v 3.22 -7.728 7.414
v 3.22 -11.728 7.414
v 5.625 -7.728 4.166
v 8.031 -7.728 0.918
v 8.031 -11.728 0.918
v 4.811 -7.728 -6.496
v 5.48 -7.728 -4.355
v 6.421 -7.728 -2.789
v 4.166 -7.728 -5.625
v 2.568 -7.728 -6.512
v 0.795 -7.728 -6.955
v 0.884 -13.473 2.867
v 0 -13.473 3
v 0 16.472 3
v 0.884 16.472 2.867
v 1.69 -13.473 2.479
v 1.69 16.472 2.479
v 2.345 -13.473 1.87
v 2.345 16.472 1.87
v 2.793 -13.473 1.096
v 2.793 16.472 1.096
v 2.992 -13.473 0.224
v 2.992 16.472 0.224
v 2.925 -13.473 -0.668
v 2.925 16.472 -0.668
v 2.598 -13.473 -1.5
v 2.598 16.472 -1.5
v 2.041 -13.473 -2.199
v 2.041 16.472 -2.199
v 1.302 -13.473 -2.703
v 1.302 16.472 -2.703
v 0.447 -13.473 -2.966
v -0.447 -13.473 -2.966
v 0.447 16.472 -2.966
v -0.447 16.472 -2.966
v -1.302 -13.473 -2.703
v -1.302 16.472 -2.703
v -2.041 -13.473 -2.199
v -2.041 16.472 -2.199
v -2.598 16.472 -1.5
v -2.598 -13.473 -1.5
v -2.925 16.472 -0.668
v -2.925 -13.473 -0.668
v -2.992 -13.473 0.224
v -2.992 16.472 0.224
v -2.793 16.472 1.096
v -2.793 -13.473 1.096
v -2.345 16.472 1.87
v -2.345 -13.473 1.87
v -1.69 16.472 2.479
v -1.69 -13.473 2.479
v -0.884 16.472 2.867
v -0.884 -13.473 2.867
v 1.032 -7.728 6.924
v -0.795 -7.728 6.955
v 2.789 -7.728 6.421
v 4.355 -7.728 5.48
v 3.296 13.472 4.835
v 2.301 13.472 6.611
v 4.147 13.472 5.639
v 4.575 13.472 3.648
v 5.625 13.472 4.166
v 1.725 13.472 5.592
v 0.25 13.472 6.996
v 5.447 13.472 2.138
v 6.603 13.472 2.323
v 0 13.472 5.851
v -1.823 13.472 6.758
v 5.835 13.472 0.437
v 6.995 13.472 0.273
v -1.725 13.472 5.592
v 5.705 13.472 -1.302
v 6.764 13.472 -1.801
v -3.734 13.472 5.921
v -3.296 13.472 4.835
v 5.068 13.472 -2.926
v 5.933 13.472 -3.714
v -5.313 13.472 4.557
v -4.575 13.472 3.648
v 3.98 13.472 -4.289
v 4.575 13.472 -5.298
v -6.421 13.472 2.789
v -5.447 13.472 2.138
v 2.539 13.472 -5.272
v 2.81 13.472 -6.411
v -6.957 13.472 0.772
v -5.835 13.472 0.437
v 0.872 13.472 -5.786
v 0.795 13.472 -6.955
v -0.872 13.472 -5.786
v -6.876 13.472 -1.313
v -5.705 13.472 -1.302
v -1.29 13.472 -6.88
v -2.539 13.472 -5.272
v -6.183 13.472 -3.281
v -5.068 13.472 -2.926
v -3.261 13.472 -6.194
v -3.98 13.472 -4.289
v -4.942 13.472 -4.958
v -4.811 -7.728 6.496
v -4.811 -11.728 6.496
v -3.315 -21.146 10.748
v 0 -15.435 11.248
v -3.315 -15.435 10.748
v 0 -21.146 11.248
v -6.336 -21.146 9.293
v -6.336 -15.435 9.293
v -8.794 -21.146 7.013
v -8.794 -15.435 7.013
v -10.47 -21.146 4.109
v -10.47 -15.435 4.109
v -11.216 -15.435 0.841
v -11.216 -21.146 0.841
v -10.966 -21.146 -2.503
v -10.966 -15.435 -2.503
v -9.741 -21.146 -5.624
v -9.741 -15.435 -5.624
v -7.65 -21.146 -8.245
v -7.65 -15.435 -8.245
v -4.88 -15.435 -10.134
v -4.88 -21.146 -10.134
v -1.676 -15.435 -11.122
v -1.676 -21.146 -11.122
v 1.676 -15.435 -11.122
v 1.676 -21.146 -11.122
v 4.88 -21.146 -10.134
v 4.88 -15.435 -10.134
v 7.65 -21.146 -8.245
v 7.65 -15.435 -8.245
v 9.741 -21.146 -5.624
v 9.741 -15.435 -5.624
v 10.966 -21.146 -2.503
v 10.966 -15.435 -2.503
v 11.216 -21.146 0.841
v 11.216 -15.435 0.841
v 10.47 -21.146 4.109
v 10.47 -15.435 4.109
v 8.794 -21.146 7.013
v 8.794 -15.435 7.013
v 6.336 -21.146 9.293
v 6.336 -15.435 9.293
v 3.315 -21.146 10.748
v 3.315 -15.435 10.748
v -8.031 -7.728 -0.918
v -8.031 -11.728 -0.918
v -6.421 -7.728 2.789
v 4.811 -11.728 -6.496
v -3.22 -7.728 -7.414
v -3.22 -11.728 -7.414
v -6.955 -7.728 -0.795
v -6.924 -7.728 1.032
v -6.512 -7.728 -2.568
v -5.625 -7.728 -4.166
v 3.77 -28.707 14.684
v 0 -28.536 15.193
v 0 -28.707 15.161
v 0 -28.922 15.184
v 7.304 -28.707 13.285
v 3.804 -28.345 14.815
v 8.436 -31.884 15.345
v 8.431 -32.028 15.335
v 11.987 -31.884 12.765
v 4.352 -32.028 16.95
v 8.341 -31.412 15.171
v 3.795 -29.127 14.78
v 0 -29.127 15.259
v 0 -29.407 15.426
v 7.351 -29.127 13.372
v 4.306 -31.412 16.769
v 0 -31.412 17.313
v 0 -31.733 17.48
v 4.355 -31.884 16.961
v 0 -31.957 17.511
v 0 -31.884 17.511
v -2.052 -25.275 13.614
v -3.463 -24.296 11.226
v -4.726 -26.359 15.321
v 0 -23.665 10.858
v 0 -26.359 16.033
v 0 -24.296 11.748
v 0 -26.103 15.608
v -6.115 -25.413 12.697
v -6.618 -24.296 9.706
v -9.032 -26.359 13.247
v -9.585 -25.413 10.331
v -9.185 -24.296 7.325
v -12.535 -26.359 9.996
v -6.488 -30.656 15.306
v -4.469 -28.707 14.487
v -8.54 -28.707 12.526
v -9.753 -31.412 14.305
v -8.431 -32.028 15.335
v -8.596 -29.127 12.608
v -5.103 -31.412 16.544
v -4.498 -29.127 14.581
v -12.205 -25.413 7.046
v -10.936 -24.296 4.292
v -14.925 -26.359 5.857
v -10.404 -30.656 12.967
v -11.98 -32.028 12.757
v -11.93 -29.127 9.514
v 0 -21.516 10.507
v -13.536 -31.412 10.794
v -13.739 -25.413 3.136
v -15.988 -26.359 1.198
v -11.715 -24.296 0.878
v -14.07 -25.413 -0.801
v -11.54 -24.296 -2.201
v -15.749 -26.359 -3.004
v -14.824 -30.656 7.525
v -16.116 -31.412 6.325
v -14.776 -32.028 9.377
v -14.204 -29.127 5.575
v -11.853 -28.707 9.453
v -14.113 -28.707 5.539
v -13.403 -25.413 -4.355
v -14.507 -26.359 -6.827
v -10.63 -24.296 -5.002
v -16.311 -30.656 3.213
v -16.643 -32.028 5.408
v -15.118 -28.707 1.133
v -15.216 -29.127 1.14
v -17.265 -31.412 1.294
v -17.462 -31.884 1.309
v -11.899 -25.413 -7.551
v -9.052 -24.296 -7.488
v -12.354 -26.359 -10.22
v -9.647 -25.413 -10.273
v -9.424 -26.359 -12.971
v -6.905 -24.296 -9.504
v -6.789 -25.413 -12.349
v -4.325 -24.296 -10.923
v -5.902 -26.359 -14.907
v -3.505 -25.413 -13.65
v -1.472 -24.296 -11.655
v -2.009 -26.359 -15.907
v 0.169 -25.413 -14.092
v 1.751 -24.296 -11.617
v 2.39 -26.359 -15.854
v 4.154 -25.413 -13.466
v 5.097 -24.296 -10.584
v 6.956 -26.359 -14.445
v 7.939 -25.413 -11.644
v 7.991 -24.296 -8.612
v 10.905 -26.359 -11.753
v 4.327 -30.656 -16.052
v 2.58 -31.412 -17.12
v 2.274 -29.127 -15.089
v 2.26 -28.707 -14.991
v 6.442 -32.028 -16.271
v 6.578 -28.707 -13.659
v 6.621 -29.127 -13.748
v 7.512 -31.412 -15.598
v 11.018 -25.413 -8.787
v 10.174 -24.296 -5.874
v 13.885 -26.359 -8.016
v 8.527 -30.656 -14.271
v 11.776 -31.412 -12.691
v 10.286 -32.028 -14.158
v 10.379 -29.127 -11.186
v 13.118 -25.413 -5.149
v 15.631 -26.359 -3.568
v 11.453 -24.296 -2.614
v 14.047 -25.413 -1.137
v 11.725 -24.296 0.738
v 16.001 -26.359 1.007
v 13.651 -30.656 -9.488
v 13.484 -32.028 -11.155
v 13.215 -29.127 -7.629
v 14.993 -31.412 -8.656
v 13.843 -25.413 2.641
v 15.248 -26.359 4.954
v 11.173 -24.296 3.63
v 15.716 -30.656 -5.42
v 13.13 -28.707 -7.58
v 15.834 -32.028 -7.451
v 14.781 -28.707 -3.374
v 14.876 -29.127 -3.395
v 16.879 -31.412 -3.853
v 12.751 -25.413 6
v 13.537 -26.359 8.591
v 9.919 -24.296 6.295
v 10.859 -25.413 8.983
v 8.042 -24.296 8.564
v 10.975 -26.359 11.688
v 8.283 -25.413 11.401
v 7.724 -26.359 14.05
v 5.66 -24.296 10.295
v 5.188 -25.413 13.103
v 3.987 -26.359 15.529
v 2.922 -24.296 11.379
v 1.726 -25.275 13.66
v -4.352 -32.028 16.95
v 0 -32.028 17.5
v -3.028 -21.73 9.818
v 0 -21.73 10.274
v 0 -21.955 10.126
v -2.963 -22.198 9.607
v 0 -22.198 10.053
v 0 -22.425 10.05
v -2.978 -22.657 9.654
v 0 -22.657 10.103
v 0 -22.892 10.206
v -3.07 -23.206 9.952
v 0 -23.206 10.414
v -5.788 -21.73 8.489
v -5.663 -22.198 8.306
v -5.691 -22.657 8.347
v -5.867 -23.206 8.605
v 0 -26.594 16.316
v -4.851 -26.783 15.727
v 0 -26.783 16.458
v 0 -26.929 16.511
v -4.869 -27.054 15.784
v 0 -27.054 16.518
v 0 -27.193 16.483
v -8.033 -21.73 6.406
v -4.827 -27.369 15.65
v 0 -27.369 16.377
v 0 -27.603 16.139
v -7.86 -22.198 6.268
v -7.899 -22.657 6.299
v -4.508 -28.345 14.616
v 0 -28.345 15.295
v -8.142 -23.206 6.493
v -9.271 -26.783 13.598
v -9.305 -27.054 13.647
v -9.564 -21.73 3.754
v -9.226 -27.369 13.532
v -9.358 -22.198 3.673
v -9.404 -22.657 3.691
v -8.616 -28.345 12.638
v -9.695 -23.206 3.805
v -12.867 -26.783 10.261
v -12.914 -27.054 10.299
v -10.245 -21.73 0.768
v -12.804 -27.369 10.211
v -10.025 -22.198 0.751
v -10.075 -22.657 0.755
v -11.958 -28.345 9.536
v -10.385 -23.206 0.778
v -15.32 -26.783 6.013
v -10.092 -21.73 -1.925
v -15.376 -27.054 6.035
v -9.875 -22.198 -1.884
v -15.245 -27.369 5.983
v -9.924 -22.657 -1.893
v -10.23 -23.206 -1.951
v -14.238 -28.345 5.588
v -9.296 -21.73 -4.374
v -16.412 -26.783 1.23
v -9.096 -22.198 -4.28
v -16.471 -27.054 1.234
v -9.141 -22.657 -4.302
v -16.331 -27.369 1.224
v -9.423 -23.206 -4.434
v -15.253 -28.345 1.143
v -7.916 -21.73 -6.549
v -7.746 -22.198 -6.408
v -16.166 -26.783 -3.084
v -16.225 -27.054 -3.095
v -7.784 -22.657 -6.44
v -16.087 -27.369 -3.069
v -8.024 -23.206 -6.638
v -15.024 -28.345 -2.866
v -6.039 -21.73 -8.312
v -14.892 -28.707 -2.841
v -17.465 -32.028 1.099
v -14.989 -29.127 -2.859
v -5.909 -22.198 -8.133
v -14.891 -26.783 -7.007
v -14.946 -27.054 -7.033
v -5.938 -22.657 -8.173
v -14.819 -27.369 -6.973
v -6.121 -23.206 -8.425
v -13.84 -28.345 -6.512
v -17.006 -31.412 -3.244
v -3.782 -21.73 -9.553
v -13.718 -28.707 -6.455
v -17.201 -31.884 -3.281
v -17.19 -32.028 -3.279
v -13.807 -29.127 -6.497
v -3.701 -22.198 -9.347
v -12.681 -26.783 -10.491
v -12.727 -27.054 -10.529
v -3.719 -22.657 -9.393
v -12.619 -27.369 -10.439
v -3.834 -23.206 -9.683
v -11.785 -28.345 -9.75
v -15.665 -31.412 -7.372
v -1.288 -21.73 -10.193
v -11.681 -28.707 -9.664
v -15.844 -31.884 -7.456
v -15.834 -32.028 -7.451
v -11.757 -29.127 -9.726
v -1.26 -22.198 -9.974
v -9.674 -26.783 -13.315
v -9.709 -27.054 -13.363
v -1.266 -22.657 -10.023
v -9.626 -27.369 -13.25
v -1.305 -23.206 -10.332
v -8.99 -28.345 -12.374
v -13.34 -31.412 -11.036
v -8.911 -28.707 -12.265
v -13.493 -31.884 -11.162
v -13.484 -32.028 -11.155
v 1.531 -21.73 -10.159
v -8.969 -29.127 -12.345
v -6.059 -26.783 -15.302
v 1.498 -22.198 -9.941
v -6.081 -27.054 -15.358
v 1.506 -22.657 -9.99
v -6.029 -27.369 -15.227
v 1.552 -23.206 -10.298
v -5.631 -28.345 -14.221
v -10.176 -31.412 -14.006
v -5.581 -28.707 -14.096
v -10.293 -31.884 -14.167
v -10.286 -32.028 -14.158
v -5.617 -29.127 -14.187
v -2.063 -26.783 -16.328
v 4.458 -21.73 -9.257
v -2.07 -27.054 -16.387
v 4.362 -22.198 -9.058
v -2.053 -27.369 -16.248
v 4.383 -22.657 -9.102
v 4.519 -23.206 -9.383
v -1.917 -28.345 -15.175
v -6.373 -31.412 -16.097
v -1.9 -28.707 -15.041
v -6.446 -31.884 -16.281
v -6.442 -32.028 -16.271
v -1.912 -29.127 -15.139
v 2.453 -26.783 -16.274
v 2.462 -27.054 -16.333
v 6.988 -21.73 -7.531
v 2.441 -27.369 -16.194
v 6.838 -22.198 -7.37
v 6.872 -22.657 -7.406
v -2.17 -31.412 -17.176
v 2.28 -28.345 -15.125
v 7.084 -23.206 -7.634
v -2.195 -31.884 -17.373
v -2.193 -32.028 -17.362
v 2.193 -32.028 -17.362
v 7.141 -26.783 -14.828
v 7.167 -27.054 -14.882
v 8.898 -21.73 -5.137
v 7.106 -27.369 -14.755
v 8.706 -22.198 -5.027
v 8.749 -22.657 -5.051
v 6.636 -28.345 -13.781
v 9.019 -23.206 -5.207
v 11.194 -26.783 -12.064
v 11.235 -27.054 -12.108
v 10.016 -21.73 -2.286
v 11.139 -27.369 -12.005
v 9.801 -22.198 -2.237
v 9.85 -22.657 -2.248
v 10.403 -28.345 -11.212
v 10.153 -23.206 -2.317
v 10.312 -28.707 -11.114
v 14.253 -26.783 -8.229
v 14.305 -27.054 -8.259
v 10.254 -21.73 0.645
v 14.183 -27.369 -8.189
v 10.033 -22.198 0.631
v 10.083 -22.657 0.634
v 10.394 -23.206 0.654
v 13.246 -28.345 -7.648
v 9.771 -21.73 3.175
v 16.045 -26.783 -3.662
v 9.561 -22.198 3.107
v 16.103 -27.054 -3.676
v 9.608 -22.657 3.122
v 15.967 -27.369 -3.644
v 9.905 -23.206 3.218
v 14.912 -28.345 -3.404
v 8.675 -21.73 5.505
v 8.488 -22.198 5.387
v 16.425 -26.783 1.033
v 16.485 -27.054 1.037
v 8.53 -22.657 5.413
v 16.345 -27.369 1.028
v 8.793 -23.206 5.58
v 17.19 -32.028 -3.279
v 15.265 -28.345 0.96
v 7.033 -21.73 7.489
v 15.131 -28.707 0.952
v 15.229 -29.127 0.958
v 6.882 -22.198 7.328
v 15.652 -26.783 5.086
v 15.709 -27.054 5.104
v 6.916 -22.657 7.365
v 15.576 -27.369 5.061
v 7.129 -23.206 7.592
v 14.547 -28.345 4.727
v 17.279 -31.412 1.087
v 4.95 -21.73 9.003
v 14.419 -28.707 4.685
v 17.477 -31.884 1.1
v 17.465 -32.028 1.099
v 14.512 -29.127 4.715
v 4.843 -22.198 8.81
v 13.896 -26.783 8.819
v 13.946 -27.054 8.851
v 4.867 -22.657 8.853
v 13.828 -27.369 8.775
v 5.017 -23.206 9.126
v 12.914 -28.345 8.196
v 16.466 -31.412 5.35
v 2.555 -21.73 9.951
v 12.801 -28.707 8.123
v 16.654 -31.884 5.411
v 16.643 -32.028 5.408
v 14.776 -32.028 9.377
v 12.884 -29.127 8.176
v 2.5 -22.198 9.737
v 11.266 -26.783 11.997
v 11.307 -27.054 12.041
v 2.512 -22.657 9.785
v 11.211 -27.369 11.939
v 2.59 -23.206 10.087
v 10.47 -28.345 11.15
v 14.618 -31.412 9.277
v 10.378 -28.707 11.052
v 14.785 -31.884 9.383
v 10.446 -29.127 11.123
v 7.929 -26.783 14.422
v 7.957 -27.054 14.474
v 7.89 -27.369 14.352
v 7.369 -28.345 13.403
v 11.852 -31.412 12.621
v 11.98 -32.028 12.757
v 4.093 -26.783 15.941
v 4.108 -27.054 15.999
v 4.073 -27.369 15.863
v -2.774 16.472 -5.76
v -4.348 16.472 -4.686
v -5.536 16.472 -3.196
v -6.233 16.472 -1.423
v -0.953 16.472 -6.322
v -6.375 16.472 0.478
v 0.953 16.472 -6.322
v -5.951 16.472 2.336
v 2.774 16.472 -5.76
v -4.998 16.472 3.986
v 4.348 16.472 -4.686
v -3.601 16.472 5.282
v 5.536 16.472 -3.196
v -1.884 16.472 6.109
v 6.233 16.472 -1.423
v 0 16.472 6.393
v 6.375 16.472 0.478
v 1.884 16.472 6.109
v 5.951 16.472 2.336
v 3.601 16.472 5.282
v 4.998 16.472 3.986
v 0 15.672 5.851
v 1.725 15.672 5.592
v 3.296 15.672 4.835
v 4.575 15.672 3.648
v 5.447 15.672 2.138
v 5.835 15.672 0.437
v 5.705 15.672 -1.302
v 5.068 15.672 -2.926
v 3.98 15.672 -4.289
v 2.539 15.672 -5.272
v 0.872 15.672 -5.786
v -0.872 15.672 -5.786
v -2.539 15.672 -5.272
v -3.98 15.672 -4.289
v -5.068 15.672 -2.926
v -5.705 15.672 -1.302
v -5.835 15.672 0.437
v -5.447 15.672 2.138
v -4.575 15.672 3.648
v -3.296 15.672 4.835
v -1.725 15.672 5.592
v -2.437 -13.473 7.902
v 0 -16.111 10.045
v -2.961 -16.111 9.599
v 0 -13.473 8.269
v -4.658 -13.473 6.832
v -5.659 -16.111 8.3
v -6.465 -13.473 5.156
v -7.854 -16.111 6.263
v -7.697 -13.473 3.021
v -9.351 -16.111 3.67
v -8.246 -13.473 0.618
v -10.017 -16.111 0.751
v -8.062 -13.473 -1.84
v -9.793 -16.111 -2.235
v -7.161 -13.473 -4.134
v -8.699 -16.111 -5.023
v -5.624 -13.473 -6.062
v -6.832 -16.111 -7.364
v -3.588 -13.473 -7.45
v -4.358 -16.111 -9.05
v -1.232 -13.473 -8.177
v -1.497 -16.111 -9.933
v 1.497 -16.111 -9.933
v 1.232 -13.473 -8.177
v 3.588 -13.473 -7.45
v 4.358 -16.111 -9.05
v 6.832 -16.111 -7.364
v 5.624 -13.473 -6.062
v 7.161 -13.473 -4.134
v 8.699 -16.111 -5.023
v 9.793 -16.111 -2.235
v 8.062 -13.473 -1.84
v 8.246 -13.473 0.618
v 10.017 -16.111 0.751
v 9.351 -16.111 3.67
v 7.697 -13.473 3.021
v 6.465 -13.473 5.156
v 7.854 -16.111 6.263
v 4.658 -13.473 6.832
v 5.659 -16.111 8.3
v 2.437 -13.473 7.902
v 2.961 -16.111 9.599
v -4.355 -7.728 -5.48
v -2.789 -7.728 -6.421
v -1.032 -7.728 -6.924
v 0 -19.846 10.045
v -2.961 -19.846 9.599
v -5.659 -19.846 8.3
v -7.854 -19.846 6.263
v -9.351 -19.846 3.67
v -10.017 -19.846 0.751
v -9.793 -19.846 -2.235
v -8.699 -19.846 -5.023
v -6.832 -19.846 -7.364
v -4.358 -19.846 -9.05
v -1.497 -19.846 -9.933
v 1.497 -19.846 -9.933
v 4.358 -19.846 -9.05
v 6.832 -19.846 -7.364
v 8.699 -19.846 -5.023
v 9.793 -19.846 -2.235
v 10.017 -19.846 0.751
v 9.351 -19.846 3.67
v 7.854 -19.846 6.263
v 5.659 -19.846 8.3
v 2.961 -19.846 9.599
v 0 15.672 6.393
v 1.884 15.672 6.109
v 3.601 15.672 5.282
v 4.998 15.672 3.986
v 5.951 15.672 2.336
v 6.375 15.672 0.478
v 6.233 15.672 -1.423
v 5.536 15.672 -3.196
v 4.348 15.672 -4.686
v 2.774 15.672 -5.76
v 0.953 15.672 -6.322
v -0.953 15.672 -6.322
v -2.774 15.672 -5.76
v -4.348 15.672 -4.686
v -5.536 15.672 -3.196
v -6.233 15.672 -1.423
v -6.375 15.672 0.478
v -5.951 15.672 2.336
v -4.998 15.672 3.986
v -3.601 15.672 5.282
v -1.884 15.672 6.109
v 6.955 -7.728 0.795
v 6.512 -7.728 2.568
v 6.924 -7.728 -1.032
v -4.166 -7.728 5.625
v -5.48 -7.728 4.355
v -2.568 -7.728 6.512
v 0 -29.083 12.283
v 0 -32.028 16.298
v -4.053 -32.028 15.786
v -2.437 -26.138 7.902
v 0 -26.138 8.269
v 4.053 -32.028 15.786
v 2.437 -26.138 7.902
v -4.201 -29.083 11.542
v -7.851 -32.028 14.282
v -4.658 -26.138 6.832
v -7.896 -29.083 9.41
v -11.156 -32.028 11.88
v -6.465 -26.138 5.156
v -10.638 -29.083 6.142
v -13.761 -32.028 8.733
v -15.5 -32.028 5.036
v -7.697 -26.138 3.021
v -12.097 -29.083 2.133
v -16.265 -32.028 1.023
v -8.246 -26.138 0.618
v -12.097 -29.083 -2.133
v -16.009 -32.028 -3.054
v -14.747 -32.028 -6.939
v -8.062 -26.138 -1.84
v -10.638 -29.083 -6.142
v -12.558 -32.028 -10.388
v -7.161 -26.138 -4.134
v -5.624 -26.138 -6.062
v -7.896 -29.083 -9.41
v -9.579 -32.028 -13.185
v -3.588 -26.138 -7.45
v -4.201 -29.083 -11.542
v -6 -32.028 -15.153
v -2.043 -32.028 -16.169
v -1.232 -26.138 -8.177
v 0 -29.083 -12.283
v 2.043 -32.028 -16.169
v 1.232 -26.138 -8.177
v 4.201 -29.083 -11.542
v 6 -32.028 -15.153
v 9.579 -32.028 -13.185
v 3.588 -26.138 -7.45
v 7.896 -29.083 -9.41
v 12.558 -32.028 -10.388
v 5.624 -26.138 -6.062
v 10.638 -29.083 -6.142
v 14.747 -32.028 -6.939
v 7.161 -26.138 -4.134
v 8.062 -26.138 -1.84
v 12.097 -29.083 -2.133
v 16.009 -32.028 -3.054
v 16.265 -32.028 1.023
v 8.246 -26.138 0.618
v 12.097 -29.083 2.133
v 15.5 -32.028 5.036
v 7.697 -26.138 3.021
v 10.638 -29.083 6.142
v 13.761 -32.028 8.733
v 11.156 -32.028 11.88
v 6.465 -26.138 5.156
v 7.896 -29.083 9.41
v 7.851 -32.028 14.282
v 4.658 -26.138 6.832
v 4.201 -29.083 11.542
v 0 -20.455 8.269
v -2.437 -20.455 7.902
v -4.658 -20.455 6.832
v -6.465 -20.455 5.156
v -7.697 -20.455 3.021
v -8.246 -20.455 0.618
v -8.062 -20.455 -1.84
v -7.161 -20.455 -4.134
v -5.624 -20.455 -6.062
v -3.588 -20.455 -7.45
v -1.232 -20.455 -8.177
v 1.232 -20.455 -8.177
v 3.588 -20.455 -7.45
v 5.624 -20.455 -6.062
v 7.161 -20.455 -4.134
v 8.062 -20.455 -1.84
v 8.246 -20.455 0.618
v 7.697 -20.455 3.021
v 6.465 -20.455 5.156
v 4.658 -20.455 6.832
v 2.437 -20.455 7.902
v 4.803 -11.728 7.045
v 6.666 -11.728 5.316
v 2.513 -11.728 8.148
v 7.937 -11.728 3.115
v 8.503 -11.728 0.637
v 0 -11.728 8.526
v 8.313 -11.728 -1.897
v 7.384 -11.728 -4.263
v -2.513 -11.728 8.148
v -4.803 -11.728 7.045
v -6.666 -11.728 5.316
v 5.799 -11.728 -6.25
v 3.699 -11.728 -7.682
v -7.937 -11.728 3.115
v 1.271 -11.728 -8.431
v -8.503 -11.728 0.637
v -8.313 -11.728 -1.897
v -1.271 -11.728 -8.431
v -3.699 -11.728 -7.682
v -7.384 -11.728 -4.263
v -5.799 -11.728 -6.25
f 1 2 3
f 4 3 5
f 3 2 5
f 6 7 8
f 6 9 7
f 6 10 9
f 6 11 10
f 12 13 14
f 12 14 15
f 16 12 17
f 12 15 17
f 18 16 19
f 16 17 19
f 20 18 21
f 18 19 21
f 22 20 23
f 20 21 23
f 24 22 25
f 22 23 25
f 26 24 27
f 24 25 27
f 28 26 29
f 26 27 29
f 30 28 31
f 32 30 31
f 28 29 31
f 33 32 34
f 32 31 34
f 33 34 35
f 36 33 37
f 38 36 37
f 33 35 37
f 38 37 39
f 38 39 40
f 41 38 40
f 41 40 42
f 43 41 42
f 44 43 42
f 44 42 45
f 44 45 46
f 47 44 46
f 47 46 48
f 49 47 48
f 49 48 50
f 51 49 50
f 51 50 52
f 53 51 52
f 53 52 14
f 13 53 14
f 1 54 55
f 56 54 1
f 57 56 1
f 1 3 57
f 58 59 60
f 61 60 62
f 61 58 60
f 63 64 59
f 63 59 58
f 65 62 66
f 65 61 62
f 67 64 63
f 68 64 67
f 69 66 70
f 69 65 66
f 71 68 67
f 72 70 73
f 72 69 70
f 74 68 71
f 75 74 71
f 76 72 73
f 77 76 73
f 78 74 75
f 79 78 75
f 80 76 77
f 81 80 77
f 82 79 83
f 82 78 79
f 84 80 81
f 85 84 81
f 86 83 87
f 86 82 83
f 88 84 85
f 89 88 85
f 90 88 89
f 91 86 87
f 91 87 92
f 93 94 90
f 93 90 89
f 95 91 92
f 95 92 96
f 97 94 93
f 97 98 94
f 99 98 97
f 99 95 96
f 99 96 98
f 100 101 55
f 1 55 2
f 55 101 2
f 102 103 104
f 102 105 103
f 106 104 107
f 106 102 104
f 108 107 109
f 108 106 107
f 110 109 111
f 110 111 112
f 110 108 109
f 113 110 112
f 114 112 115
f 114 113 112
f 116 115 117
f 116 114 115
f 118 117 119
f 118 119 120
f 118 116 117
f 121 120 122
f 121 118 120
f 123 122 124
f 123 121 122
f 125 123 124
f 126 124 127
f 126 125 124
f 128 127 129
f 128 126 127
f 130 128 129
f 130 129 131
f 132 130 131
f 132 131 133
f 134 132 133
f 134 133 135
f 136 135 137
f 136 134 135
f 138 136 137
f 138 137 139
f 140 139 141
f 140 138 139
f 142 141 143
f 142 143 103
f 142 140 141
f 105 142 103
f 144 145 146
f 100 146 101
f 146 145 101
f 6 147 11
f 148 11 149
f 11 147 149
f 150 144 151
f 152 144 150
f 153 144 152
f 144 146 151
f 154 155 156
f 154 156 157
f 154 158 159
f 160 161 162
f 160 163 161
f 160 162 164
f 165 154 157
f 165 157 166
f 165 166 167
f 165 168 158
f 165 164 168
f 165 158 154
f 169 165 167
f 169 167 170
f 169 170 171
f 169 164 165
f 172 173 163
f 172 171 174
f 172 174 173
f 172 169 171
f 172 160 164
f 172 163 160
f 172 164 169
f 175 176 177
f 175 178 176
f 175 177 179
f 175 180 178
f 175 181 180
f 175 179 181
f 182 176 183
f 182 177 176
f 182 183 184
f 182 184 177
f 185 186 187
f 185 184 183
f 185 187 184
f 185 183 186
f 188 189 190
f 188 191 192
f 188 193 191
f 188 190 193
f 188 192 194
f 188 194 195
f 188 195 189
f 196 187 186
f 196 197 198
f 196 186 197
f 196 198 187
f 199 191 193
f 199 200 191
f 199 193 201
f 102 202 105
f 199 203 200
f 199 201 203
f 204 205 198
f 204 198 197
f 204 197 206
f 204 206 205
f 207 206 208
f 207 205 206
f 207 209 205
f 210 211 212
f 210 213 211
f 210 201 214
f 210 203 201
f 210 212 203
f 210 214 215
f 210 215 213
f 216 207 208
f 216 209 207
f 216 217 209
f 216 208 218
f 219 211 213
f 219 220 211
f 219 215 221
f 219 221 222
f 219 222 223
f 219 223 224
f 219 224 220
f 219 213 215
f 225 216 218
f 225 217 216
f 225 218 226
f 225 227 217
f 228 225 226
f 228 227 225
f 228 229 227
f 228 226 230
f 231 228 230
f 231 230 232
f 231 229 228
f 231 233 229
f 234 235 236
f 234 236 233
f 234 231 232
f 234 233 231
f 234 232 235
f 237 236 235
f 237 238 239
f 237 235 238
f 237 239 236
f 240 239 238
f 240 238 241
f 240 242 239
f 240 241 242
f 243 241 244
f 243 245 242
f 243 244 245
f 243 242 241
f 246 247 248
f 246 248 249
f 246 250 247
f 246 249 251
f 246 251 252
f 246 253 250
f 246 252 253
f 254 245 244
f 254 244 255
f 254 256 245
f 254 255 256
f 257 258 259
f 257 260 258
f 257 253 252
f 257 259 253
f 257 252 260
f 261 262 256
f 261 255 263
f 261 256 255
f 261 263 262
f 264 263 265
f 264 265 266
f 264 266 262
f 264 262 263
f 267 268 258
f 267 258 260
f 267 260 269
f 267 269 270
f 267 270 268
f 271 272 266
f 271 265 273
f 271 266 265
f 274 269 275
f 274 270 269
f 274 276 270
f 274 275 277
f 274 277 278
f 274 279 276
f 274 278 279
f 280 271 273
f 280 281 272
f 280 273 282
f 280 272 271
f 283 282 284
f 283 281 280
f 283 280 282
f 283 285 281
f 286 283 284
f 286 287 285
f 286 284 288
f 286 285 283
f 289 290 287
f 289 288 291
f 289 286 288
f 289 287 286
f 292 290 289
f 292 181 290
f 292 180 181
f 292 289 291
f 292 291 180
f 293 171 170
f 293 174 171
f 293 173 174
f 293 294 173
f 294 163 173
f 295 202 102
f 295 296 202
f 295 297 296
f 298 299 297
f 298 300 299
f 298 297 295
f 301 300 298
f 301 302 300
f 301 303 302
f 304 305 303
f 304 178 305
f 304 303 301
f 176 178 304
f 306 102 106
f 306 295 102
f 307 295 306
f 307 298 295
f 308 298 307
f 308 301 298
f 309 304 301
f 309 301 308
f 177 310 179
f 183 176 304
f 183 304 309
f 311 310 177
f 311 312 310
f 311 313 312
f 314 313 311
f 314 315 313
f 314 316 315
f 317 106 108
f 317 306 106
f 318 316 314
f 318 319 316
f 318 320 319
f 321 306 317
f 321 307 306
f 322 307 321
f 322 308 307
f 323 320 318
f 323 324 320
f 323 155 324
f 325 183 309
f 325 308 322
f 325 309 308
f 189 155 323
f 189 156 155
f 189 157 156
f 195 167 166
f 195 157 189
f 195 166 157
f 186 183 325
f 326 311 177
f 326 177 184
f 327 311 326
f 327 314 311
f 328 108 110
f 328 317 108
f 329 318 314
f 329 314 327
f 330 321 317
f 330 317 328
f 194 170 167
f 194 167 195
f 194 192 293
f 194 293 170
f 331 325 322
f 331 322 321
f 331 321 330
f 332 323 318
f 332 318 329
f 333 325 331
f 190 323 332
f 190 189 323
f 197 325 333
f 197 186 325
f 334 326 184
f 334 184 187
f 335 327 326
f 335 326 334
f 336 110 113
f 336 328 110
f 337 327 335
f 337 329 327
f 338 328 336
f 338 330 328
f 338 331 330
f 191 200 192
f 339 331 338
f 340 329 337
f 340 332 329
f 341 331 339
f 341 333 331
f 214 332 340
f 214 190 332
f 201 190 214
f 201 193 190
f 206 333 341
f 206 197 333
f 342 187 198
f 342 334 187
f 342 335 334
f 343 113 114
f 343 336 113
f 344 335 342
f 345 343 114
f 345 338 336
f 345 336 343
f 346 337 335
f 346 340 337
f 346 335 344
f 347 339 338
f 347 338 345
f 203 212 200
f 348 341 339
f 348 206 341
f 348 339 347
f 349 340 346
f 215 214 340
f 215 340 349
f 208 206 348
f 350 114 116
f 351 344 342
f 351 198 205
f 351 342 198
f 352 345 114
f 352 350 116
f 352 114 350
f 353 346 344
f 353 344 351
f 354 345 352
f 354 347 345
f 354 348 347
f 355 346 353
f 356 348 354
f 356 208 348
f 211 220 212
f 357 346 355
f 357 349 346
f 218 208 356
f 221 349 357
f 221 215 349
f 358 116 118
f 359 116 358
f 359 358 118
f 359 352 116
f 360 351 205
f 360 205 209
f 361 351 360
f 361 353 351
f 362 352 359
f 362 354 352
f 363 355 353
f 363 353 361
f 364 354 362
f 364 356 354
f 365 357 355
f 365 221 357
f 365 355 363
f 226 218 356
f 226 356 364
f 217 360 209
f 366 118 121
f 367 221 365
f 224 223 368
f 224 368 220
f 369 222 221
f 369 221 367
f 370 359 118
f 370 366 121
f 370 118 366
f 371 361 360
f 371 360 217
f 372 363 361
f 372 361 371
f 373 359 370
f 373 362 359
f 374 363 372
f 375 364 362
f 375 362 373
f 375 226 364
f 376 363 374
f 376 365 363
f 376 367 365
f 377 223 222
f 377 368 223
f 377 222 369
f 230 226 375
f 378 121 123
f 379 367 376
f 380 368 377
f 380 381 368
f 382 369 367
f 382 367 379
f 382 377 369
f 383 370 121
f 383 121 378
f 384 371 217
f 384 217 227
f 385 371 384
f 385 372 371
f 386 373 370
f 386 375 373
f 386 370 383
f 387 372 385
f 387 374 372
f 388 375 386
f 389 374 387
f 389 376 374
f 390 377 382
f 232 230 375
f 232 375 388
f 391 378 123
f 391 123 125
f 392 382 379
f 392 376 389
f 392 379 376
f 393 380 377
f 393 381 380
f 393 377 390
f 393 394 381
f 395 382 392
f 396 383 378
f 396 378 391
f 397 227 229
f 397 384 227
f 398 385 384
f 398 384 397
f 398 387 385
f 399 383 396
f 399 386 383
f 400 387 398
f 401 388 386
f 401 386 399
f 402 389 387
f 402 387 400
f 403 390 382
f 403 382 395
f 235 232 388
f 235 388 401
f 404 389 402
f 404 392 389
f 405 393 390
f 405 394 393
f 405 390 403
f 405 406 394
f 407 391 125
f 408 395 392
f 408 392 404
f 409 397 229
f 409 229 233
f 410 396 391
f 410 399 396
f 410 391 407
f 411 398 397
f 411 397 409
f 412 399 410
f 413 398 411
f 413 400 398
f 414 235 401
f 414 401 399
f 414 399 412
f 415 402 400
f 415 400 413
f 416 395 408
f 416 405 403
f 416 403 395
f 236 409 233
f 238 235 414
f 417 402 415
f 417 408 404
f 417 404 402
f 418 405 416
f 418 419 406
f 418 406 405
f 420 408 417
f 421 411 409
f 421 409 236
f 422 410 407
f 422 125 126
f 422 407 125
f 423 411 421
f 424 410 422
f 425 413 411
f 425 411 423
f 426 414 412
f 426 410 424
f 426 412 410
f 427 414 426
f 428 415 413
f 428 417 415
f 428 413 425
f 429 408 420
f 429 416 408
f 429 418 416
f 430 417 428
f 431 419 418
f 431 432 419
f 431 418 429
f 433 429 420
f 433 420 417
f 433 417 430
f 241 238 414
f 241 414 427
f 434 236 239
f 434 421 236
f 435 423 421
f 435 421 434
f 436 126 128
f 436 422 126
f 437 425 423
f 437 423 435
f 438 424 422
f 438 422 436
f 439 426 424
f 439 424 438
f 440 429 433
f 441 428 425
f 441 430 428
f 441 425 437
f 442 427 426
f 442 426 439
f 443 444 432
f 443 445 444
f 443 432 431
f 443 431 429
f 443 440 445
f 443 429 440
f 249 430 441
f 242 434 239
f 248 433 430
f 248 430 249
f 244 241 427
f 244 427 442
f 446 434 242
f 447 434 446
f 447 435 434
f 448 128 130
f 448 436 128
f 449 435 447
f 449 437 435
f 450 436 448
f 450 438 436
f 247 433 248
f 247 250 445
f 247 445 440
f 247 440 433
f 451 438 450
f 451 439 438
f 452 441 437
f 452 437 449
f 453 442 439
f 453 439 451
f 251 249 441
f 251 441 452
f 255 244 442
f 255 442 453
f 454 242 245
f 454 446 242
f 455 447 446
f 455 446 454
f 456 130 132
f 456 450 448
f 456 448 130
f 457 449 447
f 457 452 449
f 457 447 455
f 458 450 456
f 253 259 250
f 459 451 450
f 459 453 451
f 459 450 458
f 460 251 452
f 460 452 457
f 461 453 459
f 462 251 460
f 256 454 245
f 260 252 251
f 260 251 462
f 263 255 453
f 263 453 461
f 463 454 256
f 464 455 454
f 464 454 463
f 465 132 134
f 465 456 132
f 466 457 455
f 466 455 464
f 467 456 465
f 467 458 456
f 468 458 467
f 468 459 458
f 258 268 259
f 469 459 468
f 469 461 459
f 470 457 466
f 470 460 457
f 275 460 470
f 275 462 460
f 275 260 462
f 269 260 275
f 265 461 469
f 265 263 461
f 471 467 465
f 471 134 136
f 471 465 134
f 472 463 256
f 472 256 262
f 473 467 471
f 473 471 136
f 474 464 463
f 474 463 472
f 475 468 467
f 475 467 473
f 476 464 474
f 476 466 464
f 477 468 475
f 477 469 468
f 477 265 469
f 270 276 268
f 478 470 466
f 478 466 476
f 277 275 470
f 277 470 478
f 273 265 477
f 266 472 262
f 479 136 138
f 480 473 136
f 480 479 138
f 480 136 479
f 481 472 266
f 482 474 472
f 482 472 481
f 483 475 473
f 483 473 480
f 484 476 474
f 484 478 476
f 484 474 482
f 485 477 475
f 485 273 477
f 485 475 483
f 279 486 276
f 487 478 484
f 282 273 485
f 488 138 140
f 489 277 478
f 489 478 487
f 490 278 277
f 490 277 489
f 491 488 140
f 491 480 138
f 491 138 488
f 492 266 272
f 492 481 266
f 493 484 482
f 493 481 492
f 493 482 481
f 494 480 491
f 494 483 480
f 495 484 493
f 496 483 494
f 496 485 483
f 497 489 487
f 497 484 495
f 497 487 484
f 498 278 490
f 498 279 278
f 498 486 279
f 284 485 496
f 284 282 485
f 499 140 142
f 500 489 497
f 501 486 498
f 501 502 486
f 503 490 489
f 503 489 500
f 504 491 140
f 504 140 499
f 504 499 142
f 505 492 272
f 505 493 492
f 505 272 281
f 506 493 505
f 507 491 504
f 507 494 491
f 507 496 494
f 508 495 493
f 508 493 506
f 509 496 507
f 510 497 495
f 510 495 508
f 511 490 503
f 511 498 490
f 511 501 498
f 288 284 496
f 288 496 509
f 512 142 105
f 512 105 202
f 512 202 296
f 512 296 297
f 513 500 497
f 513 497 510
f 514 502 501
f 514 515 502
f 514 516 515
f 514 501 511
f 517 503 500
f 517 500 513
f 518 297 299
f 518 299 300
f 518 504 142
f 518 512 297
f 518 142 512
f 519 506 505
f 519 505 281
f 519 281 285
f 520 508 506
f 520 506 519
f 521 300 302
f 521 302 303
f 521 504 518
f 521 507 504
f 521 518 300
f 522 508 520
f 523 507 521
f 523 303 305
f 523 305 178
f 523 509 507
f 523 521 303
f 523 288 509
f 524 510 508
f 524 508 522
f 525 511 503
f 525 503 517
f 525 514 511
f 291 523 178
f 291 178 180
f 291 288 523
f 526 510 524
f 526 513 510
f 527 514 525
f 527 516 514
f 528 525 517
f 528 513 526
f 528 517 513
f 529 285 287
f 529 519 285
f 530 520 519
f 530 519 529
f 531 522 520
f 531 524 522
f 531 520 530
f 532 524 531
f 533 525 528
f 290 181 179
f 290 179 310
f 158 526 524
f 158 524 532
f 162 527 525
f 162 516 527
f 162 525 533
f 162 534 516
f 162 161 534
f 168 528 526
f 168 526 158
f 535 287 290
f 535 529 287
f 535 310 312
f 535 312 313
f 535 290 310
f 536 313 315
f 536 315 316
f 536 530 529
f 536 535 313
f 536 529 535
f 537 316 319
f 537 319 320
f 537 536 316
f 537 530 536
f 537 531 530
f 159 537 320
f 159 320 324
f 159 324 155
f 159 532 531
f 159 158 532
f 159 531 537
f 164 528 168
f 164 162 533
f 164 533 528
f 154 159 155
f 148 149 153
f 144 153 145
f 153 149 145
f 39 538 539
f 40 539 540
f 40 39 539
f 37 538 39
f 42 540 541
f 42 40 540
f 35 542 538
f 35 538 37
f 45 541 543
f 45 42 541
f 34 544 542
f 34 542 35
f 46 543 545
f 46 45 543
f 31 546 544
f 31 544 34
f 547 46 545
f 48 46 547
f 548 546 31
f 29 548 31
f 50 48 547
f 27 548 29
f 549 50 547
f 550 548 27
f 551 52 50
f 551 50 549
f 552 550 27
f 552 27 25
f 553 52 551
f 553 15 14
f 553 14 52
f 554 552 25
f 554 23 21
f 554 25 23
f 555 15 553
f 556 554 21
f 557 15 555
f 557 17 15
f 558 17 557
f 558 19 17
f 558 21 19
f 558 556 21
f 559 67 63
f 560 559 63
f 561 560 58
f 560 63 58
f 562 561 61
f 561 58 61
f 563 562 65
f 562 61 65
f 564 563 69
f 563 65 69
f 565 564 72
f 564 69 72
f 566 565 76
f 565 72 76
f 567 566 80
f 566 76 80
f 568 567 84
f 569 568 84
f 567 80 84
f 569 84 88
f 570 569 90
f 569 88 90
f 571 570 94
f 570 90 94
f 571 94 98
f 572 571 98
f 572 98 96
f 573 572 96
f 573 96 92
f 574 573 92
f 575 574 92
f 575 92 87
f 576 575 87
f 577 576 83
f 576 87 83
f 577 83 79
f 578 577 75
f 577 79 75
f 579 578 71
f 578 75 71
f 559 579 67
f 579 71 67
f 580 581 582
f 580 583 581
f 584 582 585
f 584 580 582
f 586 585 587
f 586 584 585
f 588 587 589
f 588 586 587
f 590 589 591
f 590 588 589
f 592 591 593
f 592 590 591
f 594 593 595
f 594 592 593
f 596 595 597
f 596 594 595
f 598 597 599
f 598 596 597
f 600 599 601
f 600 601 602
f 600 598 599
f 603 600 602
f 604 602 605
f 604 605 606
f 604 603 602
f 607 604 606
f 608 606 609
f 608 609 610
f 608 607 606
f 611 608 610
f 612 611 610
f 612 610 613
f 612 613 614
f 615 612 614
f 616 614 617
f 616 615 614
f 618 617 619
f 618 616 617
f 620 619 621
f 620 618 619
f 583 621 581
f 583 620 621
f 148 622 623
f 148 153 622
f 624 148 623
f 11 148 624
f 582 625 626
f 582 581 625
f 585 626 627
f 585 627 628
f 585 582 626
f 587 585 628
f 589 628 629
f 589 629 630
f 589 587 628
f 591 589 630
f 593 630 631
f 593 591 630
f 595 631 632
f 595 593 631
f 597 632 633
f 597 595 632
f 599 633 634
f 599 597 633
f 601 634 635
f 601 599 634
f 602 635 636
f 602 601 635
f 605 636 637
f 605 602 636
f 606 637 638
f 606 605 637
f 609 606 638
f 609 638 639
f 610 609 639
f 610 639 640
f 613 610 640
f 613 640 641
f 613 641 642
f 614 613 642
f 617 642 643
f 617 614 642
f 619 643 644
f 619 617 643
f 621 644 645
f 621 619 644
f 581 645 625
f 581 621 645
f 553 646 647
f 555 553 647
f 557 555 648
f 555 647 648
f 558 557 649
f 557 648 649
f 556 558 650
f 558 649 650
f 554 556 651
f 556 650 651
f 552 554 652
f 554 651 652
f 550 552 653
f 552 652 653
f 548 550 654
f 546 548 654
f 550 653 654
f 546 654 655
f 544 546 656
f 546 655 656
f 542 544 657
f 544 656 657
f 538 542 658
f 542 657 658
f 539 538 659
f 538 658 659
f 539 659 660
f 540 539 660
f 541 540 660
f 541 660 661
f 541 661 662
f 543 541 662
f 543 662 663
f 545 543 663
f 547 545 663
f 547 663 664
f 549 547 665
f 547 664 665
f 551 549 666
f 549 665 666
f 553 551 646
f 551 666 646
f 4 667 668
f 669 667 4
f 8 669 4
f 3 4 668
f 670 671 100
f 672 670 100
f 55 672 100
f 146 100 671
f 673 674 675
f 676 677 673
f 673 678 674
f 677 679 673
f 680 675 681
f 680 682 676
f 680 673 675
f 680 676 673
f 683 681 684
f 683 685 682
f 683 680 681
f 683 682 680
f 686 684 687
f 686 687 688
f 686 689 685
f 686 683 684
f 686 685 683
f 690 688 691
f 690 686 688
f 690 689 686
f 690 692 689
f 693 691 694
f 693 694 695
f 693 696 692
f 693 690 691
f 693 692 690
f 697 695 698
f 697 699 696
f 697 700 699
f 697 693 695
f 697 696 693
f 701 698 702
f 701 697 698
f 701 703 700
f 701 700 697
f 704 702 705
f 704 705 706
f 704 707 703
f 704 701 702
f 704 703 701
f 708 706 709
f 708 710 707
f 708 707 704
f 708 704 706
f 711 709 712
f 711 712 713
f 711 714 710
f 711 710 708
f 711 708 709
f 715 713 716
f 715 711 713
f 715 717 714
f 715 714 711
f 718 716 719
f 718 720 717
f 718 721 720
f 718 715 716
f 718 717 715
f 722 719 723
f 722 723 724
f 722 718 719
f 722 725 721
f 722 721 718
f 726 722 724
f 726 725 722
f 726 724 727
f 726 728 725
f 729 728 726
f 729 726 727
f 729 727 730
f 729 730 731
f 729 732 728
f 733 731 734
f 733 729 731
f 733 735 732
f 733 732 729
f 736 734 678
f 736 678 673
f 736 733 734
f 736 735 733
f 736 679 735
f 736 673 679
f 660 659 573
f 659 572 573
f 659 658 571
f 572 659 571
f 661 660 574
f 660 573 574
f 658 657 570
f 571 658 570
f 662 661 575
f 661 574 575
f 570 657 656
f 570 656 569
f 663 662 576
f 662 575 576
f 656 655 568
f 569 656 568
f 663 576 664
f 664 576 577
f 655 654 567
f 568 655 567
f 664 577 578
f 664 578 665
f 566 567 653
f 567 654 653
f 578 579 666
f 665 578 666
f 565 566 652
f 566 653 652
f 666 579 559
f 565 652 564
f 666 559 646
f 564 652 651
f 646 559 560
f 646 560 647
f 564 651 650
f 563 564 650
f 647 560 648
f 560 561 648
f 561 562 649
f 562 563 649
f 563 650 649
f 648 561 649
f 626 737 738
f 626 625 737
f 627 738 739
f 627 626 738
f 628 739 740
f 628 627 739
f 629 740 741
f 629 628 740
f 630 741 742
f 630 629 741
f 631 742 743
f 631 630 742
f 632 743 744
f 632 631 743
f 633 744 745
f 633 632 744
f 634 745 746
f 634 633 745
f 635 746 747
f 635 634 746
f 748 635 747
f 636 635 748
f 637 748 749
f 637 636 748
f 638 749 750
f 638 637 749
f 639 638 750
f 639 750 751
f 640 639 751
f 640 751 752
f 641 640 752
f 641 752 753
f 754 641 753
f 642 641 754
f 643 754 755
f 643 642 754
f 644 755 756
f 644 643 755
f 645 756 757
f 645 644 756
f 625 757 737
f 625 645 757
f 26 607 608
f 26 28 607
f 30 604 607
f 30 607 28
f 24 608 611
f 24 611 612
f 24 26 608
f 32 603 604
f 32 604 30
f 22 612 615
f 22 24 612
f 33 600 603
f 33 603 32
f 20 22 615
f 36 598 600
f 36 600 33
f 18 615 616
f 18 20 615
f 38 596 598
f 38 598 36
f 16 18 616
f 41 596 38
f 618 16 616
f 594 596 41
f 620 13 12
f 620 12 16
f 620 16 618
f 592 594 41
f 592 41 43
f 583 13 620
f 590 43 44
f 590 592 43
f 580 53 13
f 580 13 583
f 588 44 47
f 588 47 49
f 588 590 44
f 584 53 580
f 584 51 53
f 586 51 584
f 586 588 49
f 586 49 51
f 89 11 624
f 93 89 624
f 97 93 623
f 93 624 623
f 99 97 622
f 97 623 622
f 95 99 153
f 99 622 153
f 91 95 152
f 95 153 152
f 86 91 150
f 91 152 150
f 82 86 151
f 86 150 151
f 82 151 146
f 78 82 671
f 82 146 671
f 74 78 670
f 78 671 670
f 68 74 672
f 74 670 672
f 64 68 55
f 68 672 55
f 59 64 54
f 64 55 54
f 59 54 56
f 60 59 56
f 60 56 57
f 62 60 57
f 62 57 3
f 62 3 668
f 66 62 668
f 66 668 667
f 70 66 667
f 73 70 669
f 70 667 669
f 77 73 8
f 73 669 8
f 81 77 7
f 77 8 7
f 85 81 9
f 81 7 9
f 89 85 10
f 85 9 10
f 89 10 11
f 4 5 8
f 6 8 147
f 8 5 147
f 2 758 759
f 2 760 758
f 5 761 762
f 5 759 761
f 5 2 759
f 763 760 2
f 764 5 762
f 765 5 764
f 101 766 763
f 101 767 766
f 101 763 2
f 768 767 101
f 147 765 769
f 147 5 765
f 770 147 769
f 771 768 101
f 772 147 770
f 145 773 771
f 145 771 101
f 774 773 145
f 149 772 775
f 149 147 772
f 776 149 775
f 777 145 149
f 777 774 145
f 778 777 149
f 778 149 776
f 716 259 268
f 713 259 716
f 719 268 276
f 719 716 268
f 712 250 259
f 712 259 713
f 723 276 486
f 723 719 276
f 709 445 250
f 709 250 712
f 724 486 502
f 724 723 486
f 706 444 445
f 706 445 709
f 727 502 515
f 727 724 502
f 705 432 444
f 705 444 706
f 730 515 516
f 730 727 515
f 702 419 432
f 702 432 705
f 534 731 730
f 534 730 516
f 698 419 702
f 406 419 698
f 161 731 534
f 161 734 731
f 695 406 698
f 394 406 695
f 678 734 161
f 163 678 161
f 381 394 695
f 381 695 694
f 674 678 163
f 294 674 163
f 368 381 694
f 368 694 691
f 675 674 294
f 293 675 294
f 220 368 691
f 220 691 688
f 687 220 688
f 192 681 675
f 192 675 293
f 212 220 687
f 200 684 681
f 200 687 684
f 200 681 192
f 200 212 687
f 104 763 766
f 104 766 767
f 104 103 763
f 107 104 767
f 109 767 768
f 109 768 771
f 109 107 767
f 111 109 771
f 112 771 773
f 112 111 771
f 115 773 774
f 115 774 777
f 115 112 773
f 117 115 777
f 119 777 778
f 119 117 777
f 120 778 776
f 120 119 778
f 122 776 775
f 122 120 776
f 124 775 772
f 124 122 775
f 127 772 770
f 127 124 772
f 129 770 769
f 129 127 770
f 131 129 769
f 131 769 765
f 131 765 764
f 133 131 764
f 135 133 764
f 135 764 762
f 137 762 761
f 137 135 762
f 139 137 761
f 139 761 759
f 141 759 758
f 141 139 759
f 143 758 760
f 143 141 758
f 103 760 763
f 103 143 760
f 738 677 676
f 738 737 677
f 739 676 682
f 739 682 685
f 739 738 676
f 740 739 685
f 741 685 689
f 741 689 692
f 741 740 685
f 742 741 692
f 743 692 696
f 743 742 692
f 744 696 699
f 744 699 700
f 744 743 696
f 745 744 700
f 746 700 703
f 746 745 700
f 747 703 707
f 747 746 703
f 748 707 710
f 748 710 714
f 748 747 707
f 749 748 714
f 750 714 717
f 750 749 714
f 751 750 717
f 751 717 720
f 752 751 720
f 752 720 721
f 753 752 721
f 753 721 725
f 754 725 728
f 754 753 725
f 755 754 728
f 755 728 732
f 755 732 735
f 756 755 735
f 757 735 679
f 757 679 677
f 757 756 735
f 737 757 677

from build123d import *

# Parameters (mm, degrees)
EXTRUDE_1_DEPTH     = 4
SKETCH_3_R          = 7
EXTRUDE_2_DEPTH     = 21.2
SKETCH_4_R          = 5.851481146
EXTRUDE_3_DEPTH     = 2.2
SKETCH_5_R          = 6.392993162
EXTRUDE_4_DEPTH     = 0.8
SKETCH_6_R          = 3
CUT_EXTRUDE_1_DEPTH = 58.8


with BuildPart() as part:
    # 草图1 → 旋转1 (revolve)
    with BuildSketch(Plane.XY, mode=Mode.PRIVATE) as revolve_1_sk:
        with BuildLine():
            Line((0, -11.727997448), (-8.526388877, -11.727997448))
            Line((-8.526388877, -11.727997448), (-11.247580715, -15.435038577))
            Line((-11.247580715, -15.435038577), (-11.247580715, -21.146383116))
            add(Edge.make_bspline(
                [(-11.247580715, -21.146383116), (-9.369073773, -21.8008603), (-10.889689746, -25.079347996), (-18.519348405, -26.382423308), (-13.657626369, -29.045080289), (-17.728346259, -31.072774498), (-17.5, -32.027997448)],
                knots=[0, 0, 0, 0, 0.239282786, 0.633272554, 0.728833694, 1, 1, 1, 1], degree=3))
            Line((-17.5, -32.027997448), (-16.297611676, -32.027997448))
            Line((-16.297611676, -32.027997448), (-8.268926003, -26.138136704))
            Line((-8.268926003, -26.138136704), (-8.268926003, -20.454901012))
            Line((-8.268926003, -20.454901012), (-10.045192391, -19.845982903))
            Line((-10.045192391, -19.845982903), (-10.045192391, -16.111285163))
            Line((-10.045192391, -16.111285163), (-8.268926003, -13.47264002))
            Line((-8.268926003, -13.47264002), (0, -13.47264002))
            Line((0, -13.47264002), (0, -11.727997448))
        make_face()
    revolve(revolve_1_sk.sketch.rotate(Axis((0, 56.825270067, 0), (0, -1, 0)), 270), axis=Axis((0, 56.825270067, 0), (0, -1, 0)))

    # 草图2 → 凸台-拉伸1 (add)
    with BuildSketch(Plane(origin=(0, -11.727997448, 0), x_dir=(1, 0, 0), z_dir=(0, 1, 0))):
        Polygon((4.810541209, 6.495538978), (-3.220031161, 7.413820382), (-8.03057237, 0.918281404), (-4.810541209, -6.495538978), (3.220031161, -7.413820382), (8.03057237, -0.918281404), align=None)
    extrude(amount=EXTRUDE_1_DEPTH)

    # 草图3 → 凸台-拉伸2 (add)
    with BuildSketch(Plane(origin=(0, -7.727997448, 0), x_dir=(1, 0, 0), z_dir=(0, 1, 0))):
        with Locations(Location((0, 0, 0), (0, 0, 83.476664908))):
            Circle(SKETCH_3_R)
    extrude(amount=EXTRUDE_2_DEPTH)

    # 草图4 → 凸台-拉伸3 (add)
    with BuildSketch(Plane(origin=(0, 13.472002552, 0), x_dir=(1, 0, 0), z_dir=(0, 1, 0))):
        with Locations(Location((0, 0, 0), (0, 0, 270))):
            Circle(SKETCH_4_R)
    extrude(amount=EXTRUDE_3_DEPTH)

    # 草图5 → 凸台-拉伸4 (add)
    with BuildSketch(Plane(origin=(0, 15.672002552, 0), x_dir=(1, 0, 0), z_dir=(0, 1, 0))):
        with Locations(Location((0, 0, 0), (0, 0, 270))):
            Circle(SKETCH_5_R)
    extrude(amount=EXTRUDE_4_DEPTH)

    # 草图6 → 切除-拉伸1 (cut)
    with BuildSketch(Plane(origin=(0, 16.472002552, 0), x_dir=(1, 0, 0), z_dir=(0, 1, 0))):
        with Locations(Location((0, 0, 0), (0, 0, 270))):
            Circle(SKETCH_6_R)
    extrude(amount=-CUT_EXTRUDE_1_DEPTH, mode=Mode.SUBTRACT)


solid = part.part
